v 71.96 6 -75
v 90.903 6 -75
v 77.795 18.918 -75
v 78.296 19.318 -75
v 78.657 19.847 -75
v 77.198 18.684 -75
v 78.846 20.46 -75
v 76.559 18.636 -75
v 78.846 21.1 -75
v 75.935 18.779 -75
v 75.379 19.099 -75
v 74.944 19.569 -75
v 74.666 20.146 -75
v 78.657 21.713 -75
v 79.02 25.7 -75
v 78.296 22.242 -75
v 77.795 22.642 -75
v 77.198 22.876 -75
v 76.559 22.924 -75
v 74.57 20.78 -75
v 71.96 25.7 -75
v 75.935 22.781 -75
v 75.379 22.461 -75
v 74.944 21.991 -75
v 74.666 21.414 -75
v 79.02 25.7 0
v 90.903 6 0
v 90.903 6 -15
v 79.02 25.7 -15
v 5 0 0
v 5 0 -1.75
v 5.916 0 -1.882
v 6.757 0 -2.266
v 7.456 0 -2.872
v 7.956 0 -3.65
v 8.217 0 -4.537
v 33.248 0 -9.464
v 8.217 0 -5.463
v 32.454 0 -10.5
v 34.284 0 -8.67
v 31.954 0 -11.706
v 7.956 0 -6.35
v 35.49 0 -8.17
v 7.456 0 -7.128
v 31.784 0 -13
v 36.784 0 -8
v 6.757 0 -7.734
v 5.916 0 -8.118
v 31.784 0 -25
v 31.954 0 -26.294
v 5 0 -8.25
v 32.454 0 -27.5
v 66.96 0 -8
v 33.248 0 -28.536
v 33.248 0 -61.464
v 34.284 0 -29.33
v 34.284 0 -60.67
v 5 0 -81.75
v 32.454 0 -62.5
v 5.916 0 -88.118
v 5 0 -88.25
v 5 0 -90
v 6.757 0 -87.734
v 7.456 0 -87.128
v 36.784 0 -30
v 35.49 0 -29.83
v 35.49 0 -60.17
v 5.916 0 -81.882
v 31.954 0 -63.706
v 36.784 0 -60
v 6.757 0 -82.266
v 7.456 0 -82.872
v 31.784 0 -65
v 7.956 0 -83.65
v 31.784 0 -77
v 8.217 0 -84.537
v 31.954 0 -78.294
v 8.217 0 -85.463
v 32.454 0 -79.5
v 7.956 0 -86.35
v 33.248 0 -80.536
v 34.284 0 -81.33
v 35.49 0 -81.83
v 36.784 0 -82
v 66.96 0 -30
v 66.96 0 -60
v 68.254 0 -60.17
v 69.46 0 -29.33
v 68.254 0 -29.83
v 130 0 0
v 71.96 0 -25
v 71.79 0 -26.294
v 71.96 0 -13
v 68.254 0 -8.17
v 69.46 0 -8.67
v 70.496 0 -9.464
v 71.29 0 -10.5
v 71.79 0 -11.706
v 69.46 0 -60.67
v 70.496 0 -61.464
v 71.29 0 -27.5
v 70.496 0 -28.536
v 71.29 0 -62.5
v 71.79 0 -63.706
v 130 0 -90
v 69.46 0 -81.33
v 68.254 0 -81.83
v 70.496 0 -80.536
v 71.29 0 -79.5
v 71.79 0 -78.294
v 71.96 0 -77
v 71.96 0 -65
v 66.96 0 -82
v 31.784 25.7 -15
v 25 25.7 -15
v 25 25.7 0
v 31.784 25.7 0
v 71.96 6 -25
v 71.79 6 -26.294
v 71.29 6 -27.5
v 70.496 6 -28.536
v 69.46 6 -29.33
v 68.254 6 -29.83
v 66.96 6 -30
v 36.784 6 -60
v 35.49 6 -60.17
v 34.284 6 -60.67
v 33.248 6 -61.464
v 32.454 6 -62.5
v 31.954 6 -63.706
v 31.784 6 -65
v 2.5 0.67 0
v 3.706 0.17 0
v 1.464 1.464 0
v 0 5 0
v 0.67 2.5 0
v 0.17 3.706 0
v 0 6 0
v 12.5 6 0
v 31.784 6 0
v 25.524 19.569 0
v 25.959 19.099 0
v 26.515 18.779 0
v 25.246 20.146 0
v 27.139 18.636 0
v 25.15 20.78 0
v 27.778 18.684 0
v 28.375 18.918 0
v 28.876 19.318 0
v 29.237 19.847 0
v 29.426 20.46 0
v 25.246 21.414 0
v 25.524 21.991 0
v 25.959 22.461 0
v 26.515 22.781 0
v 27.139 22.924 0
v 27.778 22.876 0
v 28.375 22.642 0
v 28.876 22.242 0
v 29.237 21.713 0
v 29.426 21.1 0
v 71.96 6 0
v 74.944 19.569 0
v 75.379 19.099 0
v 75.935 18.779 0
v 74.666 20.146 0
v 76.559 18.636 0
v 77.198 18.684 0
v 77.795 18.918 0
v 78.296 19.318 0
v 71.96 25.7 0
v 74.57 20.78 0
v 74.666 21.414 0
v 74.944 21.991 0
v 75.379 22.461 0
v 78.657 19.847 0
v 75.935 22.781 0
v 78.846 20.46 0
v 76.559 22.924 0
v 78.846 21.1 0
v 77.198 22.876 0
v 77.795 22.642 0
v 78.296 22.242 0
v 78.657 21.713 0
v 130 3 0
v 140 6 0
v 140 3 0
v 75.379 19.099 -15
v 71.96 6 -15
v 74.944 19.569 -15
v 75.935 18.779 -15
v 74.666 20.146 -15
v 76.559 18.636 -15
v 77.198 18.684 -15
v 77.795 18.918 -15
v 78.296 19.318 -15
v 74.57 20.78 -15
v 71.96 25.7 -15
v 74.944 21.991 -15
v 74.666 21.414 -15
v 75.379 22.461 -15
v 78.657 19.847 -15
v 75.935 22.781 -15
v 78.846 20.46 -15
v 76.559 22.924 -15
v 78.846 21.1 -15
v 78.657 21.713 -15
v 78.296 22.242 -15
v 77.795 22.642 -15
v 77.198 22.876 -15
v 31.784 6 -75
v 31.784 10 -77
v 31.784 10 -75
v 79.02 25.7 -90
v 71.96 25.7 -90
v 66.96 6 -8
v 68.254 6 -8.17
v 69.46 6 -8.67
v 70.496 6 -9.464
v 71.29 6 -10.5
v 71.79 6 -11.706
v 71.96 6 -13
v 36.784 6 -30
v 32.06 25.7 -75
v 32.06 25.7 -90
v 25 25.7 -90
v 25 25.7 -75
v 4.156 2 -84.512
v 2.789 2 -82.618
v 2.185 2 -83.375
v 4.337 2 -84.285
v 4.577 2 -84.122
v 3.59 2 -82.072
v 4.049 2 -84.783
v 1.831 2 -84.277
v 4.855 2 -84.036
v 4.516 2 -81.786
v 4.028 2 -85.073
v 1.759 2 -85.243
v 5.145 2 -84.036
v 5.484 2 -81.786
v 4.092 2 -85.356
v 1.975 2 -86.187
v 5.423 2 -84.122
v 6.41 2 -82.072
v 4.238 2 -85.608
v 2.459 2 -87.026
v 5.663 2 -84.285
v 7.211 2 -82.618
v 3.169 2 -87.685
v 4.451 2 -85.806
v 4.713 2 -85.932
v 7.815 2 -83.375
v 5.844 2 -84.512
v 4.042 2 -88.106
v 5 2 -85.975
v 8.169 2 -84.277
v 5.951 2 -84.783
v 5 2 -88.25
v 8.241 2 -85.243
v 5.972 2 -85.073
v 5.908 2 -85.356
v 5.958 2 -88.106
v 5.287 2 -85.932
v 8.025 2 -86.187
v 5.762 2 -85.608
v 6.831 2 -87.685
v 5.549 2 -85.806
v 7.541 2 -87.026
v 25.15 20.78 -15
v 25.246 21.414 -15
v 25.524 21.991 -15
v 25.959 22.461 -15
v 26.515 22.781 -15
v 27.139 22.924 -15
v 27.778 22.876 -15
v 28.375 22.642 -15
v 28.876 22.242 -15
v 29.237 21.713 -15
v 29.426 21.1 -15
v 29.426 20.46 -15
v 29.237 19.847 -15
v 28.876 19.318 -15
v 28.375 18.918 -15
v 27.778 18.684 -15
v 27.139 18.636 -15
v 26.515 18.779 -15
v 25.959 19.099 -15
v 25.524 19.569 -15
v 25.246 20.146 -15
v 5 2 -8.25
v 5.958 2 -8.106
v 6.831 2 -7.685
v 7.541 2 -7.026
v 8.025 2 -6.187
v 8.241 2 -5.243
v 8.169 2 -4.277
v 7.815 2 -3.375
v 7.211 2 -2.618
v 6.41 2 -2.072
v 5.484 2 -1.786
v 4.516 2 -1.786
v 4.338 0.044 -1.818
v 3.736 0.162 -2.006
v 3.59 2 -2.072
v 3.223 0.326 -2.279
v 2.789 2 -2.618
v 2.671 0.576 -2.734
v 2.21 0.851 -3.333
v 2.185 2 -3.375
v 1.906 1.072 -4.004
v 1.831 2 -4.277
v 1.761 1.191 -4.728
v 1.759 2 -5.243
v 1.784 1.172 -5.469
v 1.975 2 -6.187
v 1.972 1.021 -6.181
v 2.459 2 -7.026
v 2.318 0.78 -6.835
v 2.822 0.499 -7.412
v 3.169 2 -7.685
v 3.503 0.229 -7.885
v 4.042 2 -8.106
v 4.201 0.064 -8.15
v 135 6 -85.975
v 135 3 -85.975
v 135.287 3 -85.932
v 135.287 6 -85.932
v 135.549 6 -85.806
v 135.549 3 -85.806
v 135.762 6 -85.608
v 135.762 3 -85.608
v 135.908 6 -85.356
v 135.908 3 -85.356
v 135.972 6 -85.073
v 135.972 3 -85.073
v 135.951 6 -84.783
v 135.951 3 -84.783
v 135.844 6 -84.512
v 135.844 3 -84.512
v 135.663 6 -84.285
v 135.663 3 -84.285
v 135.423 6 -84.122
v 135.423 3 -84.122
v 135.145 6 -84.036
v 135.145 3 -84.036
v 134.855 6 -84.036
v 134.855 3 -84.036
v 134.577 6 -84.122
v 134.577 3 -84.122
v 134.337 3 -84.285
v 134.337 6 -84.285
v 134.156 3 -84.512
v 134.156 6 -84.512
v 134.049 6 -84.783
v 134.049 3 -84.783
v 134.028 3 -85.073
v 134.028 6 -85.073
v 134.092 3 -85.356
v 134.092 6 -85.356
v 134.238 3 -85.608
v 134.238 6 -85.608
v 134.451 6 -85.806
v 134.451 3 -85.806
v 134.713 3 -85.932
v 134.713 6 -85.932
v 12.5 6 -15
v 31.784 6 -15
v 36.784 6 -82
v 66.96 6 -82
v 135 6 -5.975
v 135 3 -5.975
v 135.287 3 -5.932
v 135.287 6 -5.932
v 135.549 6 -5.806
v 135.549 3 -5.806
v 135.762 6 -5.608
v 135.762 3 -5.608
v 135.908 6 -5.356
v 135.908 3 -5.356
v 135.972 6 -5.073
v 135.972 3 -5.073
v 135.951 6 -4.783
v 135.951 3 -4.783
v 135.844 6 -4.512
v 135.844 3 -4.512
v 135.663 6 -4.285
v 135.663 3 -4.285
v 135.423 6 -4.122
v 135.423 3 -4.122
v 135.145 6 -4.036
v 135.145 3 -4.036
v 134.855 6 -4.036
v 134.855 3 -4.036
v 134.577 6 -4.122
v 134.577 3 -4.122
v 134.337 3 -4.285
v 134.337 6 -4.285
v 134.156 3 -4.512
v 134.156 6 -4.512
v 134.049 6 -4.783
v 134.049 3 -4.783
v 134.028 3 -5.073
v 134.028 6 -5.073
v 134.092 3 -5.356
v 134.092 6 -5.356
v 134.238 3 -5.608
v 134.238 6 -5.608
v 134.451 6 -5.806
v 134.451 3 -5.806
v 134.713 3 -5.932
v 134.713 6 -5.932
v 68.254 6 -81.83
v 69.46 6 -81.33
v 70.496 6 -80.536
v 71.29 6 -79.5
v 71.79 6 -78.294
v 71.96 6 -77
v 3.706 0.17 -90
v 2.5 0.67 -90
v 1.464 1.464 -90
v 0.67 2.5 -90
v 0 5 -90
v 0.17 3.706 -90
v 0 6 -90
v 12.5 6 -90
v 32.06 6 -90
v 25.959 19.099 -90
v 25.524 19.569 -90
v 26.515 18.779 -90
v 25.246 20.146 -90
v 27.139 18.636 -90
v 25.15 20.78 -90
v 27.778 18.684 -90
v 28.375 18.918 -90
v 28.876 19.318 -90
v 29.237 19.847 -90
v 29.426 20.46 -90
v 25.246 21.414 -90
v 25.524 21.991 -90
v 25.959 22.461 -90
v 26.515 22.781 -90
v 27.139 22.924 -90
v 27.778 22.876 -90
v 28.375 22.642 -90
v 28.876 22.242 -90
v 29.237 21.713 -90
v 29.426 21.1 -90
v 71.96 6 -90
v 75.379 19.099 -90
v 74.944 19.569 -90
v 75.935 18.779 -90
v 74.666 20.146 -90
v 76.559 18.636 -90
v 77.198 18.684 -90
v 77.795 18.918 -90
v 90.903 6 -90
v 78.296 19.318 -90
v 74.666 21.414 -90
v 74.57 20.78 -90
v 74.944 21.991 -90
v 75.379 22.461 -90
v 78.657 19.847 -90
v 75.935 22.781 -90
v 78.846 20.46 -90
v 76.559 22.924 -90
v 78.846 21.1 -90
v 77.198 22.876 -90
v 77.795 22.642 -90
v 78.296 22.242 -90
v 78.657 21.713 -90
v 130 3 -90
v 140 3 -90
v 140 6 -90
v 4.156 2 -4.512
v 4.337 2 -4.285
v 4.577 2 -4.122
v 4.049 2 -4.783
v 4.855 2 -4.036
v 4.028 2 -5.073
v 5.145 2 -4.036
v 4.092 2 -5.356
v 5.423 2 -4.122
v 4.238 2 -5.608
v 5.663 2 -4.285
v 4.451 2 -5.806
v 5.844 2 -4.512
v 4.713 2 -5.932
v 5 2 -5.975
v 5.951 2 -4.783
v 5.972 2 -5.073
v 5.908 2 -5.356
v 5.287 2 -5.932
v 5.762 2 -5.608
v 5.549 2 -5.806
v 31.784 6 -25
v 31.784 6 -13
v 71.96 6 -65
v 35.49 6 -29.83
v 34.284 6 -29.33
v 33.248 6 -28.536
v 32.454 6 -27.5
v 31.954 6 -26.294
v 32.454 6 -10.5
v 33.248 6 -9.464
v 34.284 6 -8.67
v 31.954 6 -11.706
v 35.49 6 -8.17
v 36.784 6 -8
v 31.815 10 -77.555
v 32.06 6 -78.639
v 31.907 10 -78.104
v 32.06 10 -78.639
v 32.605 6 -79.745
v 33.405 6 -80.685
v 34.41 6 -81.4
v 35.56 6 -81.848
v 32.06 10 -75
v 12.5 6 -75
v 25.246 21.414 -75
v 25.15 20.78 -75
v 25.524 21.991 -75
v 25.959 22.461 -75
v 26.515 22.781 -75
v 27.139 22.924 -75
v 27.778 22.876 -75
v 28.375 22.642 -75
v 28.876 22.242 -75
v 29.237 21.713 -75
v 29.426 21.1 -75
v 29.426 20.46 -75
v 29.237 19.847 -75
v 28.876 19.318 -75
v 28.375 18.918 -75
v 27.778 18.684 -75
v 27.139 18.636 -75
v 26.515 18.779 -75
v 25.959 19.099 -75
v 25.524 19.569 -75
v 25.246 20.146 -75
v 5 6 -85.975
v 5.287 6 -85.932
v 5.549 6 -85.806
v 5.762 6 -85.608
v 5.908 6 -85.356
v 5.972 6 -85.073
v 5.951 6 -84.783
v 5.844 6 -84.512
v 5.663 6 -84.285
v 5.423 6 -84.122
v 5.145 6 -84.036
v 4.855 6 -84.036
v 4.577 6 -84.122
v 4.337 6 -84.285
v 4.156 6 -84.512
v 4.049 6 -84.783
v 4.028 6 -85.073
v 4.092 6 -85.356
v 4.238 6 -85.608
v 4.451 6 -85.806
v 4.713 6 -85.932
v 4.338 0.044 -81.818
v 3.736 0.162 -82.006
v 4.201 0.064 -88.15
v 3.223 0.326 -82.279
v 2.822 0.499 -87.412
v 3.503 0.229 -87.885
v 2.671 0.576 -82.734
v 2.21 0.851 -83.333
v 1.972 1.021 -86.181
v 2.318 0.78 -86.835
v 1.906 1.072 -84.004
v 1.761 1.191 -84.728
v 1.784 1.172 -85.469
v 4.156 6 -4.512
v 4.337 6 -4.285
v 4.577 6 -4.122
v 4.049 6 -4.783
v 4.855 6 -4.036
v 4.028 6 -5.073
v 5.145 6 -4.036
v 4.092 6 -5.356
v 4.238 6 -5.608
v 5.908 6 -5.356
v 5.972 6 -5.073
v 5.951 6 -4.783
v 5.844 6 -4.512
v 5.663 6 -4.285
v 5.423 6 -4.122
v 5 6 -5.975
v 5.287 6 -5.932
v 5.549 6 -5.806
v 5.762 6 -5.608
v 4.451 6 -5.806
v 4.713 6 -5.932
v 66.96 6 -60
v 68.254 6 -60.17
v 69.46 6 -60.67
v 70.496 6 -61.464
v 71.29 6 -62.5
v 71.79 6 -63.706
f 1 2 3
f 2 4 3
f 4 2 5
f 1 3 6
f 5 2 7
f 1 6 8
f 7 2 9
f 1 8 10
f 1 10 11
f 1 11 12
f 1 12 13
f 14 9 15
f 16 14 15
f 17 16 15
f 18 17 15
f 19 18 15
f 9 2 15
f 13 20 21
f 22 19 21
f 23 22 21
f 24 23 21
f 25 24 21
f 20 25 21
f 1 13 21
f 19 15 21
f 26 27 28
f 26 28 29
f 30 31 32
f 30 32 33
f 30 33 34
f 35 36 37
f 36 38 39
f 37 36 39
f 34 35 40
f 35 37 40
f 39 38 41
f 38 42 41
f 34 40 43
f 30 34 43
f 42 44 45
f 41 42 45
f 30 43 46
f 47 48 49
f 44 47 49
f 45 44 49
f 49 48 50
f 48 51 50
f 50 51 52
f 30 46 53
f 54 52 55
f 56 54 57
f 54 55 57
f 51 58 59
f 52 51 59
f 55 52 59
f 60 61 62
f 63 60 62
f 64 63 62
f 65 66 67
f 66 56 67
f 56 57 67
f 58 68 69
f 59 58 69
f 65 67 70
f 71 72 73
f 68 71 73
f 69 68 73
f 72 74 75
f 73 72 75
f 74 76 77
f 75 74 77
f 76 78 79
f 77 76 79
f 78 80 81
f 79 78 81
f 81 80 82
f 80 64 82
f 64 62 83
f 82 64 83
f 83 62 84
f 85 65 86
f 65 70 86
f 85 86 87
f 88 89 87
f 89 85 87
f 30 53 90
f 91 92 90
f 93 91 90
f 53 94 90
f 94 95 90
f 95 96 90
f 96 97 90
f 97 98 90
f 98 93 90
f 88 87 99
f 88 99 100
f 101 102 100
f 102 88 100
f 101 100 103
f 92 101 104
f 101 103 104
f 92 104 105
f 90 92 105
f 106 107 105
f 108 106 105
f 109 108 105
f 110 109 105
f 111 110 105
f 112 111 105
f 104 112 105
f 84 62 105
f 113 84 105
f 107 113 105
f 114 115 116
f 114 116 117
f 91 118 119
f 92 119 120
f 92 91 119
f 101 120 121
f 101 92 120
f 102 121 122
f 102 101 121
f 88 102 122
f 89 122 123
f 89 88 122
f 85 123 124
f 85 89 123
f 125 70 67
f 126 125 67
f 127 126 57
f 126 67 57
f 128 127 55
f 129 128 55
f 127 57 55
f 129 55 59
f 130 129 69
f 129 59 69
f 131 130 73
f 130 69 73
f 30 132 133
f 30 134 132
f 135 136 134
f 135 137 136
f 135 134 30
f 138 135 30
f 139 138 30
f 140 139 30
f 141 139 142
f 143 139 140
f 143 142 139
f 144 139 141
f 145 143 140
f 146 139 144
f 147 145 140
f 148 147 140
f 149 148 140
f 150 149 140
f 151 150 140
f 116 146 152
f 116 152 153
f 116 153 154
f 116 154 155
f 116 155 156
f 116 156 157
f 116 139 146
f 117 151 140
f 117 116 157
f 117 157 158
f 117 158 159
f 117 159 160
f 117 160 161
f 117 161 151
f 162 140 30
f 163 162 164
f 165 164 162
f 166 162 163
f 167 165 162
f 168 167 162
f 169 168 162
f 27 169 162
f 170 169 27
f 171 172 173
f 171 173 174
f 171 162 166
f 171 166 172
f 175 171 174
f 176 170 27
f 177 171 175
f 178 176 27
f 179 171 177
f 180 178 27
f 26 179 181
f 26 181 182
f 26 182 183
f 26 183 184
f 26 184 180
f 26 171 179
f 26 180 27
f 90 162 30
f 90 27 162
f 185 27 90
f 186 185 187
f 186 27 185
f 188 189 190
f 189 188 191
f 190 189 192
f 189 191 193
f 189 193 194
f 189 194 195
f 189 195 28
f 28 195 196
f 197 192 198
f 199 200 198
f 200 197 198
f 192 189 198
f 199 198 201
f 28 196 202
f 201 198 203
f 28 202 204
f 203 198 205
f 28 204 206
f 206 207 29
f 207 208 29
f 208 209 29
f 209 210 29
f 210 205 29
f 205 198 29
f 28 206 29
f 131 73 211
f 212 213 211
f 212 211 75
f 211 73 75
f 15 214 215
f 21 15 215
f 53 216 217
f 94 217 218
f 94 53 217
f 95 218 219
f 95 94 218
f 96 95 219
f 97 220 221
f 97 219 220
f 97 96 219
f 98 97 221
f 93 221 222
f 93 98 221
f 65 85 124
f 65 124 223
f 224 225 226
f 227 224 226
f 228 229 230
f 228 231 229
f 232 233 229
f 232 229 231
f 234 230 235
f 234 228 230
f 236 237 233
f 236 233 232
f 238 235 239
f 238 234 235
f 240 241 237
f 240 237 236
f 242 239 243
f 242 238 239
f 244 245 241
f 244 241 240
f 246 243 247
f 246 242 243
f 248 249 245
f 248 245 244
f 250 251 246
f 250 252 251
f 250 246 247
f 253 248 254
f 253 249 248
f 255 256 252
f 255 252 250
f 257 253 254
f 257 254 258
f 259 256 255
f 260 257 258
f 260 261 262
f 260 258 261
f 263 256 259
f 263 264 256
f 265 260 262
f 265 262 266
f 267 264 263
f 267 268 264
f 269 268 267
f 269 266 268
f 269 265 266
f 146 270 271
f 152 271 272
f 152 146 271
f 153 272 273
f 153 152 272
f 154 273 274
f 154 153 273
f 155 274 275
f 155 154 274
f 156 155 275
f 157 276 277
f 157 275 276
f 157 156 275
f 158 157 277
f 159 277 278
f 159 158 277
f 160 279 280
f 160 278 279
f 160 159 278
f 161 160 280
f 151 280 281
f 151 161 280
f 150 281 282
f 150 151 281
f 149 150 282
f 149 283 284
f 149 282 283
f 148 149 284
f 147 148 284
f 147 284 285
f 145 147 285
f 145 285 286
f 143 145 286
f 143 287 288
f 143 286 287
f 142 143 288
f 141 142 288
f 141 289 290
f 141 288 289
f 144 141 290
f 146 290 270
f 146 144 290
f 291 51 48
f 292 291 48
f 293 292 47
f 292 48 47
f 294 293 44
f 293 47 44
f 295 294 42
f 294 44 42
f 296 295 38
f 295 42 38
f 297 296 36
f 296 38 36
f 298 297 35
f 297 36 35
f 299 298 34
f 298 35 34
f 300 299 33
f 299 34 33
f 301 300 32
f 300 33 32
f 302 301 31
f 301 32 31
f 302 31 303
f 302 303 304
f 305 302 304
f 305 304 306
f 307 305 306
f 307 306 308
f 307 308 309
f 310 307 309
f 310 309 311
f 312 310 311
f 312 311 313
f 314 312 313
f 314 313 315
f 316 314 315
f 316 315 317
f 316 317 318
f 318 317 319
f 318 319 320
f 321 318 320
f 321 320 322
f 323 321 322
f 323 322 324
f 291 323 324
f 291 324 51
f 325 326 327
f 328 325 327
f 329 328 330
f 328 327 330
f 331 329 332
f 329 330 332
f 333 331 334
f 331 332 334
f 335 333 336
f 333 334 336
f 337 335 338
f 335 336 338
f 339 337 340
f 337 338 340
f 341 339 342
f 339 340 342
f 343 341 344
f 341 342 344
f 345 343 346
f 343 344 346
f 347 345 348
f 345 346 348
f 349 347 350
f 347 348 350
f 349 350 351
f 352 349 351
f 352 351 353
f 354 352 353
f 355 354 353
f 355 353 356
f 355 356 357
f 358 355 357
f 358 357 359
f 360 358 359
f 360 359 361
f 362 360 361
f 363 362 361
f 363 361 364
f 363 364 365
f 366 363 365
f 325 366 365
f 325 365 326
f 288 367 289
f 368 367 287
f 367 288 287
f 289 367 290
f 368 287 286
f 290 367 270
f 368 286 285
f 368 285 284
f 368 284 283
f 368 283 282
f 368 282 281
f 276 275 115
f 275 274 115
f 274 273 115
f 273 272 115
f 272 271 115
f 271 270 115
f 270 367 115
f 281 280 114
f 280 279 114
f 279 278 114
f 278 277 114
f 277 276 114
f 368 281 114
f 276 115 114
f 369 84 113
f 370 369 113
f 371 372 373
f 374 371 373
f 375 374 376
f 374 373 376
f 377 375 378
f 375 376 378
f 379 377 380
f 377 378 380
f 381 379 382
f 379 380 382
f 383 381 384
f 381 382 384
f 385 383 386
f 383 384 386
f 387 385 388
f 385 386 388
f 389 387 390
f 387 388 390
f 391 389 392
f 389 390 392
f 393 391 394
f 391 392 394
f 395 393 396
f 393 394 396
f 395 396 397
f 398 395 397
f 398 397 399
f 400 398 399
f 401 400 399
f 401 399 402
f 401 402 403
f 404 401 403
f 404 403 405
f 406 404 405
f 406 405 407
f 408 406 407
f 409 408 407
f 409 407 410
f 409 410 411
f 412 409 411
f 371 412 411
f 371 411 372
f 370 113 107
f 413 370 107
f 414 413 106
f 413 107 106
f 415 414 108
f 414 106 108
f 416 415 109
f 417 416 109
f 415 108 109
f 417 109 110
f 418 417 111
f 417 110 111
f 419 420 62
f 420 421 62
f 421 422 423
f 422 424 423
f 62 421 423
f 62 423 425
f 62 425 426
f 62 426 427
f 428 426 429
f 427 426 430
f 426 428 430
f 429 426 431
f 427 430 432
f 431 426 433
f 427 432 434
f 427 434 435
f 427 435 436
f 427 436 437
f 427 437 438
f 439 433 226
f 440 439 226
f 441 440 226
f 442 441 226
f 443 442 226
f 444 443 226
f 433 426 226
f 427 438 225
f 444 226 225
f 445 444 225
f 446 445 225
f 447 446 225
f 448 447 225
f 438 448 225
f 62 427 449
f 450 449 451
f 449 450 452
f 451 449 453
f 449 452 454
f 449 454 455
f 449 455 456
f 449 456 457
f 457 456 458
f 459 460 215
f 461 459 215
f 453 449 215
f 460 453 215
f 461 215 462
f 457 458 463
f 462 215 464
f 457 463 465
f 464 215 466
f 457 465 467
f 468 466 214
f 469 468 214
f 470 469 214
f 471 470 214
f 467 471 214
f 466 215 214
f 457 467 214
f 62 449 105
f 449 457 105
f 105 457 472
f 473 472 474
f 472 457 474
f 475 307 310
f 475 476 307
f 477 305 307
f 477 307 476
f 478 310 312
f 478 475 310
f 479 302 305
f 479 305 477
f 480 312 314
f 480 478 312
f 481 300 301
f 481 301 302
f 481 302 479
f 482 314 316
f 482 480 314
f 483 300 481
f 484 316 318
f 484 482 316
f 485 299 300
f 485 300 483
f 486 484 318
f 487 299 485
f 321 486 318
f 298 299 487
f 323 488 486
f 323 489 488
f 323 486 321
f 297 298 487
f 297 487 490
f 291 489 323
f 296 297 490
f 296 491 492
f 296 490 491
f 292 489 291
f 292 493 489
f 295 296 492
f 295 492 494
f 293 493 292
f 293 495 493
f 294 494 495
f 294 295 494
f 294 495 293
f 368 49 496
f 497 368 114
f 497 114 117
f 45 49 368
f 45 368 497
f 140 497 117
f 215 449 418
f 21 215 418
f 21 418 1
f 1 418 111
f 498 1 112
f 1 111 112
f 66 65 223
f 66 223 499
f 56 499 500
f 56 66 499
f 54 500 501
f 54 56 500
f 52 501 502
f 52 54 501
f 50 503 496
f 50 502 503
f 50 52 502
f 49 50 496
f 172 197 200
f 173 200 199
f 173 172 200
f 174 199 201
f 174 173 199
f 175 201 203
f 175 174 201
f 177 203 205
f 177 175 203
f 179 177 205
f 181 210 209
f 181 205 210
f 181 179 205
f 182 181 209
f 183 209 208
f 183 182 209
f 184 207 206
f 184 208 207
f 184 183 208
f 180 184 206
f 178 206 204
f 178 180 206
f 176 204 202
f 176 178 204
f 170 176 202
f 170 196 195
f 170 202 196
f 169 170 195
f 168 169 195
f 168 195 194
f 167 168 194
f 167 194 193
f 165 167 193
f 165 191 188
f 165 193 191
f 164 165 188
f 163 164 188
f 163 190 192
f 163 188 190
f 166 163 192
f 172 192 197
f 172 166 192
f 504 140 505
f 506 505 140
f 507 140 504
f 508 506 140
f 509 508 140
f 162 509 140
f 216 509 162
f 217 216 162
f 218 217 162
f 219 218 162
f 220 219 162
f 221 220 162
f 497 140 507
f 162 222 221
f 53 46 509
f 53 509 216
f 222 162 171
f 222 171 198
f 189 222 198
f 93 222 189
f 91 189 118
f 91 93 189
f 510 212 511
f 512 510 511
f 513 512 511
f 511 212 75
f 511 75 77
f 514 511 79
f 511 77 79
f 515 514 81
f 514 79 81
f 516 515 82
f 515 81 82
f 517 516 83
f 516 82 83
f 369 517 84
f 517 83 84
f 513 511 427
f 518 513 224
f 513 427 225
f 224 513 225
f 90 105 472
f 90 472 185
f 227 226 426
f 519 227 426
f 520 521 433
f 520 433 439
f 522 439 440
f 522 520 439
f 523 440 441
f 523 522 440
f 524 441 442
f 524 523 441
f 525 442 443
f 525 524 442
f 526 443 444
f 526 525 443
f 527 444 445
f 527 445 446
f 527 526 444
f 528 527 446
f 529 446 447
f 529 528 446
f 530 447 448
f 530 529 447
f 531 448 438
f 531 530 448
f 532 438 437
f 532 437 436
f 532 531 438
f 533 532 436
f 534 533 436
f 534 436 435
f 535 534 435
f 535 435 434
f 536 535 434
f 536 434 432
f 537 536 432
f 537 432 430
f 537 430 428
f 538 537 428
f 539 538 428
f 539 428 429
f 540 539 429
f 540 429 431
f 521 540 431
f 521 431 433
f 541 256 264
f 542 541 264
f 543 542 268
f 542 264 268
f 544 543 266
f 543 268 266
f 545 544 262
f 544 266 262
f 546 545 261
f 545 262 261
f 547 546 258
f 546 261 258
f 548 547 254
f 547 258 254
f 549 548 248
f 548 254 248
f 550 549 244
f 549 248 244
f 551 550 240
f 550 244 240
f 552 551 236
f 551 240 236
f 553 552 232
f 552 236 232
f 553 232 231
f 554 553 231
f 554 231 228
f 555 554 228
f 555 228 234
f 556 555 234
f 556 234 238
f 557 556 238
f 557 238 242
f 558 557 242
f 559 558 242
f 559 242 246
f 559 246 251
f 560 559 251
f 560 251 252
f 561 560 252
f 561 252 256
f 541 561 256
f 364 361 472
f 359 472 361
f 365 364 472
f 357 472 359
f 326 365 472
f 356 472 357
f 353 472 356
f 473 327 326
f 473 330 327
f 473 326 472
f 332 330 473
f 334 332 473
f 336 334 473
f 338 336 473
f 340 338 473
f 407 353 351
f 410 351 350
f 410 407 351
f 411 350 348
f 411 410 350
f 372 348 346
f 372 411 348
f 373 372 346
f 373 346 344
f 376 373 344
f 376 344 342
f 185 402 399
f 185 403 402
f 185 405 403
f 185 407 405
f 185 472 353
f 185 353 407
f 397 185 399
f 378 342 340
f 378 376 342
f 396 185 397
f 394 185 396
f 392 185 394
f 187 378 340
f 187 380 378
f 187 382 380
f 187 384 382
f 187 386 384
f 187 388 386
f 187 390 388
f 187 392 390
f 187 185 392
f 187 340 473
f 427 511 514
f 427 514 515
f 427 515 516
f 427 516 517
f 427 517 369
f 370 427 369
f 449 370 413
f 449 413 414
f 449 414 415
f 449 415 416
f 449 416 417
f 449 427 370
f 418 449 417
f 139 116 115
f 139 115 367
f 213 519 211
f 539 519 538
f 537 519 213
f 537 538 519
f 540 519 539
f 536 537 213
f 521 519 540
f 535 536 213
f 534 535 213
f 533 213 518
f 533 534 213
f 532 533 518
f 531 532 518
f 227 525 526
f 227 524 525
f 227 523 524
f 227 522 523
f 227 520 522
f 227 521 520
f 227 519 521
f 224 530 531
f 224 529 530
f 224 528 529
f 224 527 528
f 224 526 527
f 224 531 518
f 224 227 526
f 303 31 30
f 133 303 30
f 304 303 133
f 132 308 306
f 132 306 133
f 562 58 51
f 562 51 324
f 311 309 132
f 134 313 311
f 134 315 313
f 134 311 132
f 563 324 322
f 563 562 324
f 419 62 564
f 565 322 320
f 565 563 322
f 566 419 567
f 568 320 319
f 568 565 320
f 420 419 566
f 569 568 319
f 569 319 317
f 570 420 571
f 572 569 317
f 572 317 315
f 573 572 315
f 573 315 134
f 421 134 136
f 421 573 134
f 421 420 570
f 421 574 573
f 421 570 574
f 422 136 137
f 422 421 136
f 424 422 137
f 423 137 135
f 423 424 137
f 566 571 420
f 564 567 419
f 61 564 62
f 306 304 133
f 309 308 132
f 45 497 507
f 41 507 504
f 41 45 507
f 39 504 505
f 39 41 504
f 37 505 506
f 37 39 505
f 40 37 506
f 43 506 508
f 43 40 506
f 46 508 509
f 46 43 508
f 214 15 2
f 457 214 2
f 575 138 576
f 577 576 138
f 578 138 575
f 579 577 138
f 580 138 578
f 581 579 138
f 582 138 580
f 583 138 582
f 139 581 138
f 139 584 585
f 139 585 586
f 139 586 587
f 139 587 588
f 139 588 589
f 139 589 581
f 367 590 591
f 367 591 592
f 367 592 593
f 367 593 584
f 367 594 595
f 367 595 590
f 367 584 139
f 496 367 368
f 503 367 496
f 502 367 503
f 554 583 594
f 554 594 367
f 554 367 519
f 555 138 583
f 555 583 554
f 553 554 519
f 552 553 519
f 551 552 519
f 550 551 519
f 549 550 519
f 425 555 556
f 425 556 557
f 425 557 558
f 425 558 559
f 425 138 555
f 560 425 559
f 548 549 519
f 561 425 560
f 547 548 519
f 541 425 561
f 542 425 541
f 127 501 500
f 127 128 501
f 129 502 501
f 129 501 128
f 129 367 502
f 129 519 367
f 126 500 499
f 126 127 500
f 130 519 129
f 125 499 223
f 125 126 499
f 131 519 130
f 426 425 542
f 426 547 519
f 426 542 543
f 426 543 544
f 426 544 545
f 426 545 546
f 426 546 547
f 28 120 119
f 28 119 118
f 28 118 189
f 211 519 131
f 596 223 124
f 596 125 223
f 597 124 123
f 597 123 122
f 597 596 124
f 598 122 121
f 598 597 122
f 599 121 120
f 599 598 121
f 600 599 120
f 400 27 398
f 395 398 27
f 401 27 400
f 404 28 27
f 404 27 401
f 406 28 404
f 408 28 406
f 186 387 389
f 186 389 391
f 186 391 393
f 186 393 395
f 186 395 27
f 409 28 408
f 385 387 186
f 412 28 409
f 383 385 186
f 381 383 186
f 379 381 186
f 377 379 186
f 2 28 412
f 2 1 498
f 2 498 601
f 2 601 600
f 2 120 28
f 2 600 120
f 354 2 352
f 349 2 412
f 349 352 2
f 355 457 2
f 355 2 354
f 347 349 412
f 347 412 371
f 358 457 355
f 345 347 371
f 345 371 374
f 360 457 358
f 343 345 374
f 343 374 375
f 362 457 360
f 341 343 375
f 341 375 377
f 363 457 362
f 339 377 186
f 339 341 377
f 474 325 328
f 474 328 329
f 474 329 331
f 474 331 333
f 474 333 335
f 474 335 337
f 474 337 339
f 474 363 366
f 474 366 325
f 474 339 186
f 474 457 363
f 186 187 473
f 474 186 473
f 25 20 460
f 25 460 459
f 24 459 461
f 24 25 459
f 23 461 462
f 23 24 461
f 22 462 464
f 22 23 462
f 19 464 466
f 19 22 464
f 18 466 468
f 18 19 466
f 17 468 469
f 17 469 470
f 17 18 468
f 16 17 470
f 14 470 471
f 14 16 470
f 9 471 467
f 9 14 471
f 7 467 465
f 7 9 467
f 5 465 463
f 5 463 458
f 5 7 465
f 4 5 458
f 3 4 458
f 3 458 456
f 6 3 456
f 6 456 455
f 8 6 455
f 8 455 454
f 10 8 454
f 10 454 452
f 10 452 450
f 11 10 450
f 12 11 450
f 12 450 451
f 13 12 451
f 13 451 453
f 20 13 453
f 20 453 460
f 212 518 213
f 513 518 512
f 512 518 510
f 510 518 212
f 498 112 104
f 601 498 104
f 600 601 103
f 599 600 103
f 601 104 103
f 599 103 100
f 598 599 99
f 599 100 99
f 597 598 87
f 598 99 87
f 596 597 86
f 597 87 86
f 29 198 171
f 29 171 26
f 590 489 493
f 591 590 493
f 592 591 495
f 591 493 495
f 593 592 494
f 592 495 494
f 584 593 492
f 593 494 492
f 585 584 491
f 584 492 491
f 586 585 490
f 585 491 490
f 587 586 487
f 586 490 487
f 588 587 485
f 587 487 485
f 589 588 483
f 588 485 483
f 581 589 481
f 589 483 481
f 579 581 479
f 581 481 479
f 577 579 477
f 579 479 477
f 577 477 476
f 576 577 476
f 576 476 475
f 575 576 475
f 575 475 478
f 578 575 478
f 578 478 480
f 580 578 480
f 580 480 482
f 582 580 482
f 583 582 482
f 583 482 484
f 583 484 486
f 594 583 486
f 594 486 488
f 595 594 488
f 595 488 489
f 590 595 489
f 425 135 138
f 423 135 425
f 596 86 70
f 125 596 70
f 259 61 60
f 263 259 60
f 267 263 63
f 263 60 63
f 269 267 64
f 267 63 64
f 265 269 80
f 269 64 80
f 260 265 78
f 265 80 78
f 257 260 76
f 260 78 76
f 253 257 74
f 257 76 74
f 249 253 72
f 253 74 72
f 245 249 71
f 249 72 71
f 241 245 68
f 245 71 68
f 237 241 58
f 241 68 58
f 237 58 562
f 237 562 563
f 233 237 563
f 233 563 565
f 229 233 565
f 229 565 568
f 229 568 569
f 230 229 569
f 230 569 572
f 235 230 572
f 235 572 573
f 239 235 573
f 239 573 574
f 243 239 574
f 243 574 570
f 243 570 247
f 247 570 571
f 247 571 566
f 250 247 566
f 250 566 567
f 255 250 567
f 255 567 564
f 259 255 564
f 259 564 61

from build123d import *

# Parameters (mm, degrees)
SKIZZE1_W                             = 140
SKIZZE1_H                             = 90
AUFSATZ_LINEAR_AUSTRAGEN1_DEPTH       = 6
SKIZZE2_W                             = 10
SKIZZE2_H                             = 90
SCHNITT_LINEAR_AUSTRAGEN1_DEPTH       = 3
SKIZZE3_W                             = 7.06
SKIZZE3_H                             = 25.7
SKIZZE3_R                             = 2.1
AUFSATZ_LINEAR_AUSTRAGEN2_DEPTH       = 15
AUFSATZ_LINEAR_START                  = -15
SKIZZE4_W                             = 6.783859635
SKIZZE4_H                             = 25.7
SKIZZE4_R                             = 2.1
SKIZZE4_W_2                           = 7.06
AUFSATZ_LINEAR_AUSTRAGEN3_DEPTH       = 15
VERRUNDUNG1_R                         = 5
SCHNITT_LINEAR_AUSTRAGEN2_DEPTH       = 10
SKIZZE6_R                             = 0.975
SCHNITT_LINEAR_AUSTRAGEN3_DEPTH       = 10
SKIZZE7_R                             = 3.25
SCHNITT_LINEAR_AUSTRAGEN4_DEPTH       = 2
AUFSATZ_LINEAR_START_2                = -90
AUFSATZ_LINEAR_AUSTRAGEN4_OUTLINE_R   = 2.15
AUFSATZ_LINEAR_AUSTRAGEN4_OUTLINE_R_2 = 2.1
AUFSATZ_LINEAR_AUSTRAGEN4_DEPTH       = 90
AUFSATZ_LINEAR_AUSTRAGEN4_2_DEPTH     = 15
AUFSATZ_LINEAR_AUSTRAGEN5_DEPTH       = 15
AUFSATZ_LINEAR_AUSTRAGEN6_DEPTH       = 15


# Read off the part's stored shape, not the designer's step: Aufsatz-Linear austragen4
with BuildPart() as part:
    # Skizze1 → Aufsatz-Linear austragen1 (new body)
    with BuildSketch(Plane(origin=(0, 0, 0), x_dir=(1, 0, 0), z_dir=(0, 1, 0))):
        with Locations((70, 45)):
            Rectangle(SKIZZE1_W, SKIZZE1_H)
    extrude(amount=AUFSATZ_LINEAR_AUSTRAGEN1_DEPTH)

    # Skizze2 → Schnitt-Linear austragen1 (cut)
    with BuildSketch(Plane.XZ):
        with Locations((135, -45)):
            Rectangle(SKIZZE2_W, SKIZZE2_H)
    extrude(amount=-SCHNITT_LINEAR_AUSTRAGEN1_DEPTH, mode=Mode.SUBTRACT)

    # Skizze3 → Aufsatz-Linear austragen2 (add)
    # profile 1 of 2: a face of its own
    with BuildSketch(Plane(origin=(0, 0, -90), x_dir=(-1, 0, 0), z_dir=(0, 0, -1))):
        with Locations((-75.49, 12.85)):
            Rectangle(SKIZZE3_W, SKIZZE3_H)
        with Locations((-76.72, 20.78)):
            Circle(SKIZZE3_R, mode=Mode.SUBTRACT)
    # profile 2 of 2: a face of its own
    with BuildSketch(Plane(origin=(0, 0, -90), x_dir=(-1, 0, 0), z_dir=(0, 0, -1))):
        with Locations((-28.53, 12.85)):
            Rectangle(SKIZZE3_W, SKIZZE3_H)
        with Locations((-27.3, 20.78)):
            Circle(SKIZZE3_R, mode=Mode.SUBTRACT)
    extrude(amount=-AUFSATZ_LINEAR_AUSTRAGEN2_DEPTH)

    # Skizze4 → Aufsatz-Linear austragen3 (add)
    # profile 1 of 2: a face of its own
    with BuildSketch(Plane.XY.offset(AUFSATZ_LINEAR_START)):
        with Locations((28.391929817, 12.85)):
            Rectangle(SKIZZE4_W, SKIZZE4_H)
        with Locations(Location((27.3, 20.78, 0), (0, 0, 180))):
            Circle(SKIZZE4_R, mode=Mode.SUBTRACT)
    # profile 2 of 2: a face of its own
    with BuildSketch(Plane.XY.offset(AUFSATZ_LINEAR_START)):
        with Locations((75.49, 12.85)):
            Rectangle(SKIZZE4_W_2, SKIZZE4_H)
        with Locations(Location((76.72, 20.78, 0), (0, 0, 180))):
            Circle(SKIZZE4_R, mode=Mode.SUBTRACT)
    extrude(amount=AUFSATZ_LINEAR_AUSTRAGEN3_DEPTH)

    # Verrundung1
    verrundung1_edges = [part.edges().sort_by_distance(p)[0] for p in [
        (0, 0, -45),
    ]]
    fillet(verrundung1_edges, radius=VERRUNDUNG1_R)

    # Skizze5 → Schnitt-Linear austragen2 (cut)
    with BuildSketch(Plane(origin=(0, 0, 0), x_dir=(-1, 0, 0), z_dir=(0, -1, 0))):
        with BuildLine():
            Line((-36.783859635, 8), (-66.96, 8))
            ThreePointArc((-66.96, 8), (-70.495533906, 9.464466094), (-71.96, 13))
            Line((-71.96, 13), (-71.96, 25))
            ThreePointArc((-71.96, 25), (-70.495533906, 28.535533906), (-66.96, 30))
            Line((-66.96, 30), (-36.783859635, 30))
            ThreePointArc((-36.783859635, 30), (-33.248325729, 28.535533906), (-31.783859635, 25))
            Line((-31.783859635, 25), (-31.783859635, 13))
            ThreePointArc((-31.783859635, 13), (-33.248325729, 9.464466094), (-36.783859635, 8))
        make_face()
        with BuildLine():
            Line((-36.783859635, 82), (-66.96, 82))
            ThreePointArc((-66.96, 82), (-70.495533906, 80.535533906), (-71.96, 77))
            Line((-71.96, 77), (-71.96, 65))
            ThreePointArc((-71.96, 65), (-70.495533906, 61.464466094), (-66.96, 60))
            Line((-66.96, 60), (-36.783859635, 60))
            ThreePointArc((-36.783859635, 60), (-33.248325729, 61.464466094), (-31.783859635, 65))
            Line((-31.783859635, 65), (-31.783859635, 77))
            ThreePointArc((-31.783859635, 77), (-33.248325729, 80.535533906), (-36.783859635, 82))
        make_face()
    extrude(amount=-SCHNITT_LINEAR_AUSTRAGEN2_DEPTH, mode=Mode.SUBTRACT)

    # Skizze6 → Schnitt-Linear austragen3 (cut)
    with BuildSketch(Plane.XZ):
        with Locations(Location((135, -5, 0), (0, 0, 270))):
            Circle(SKIZZE6_R)
        with Locations(Location((5, -85, 0), (0, 0, 270))):
            Circle(SKIZZE6_R)
        with Locations(Location((135, -85, 0), (0, 0, 270))):
            Circle(SKIZZE6_R)
        with Locations(Location((5, -5, 0), (0, 0, 270))):
            Circle(SKIZZE6_R)
    extrude(amount=-SCHNITT_LINEAR_AUSTRAGEN3_DEPTH, mode=Mode.SUBTRACT)

    # Skizze7 → Schnitt-Linear austragen4 (cut)
    with BuildSketch(Plane.XZ):
        with Locations(Location((5, -5, 0), (0, 0, 270))):
            Circle(SKIZZE7_R)
        with Locations(Location((5, -85, 0), (0, 0, 270))):
            Circle(SKIZZE7_R)
    extrude(amount=-SCHNITT_LINEAR_AUSTRAGEN4_DEPTH, mode=Mode.SUBTRACT)

    # Aufsatz-Linear austragen4 outline → Aufsatz-Linear austragen4 (cut)
    # profile 1 of 2: a face of its own
    with BuildSketch(Plane(origin=(0, 0, -90), x_dir=(-1, 0, 0), z_dir=(0, 0, -1)).offset(AUFSATZ_LINEAR_START_2)):
        with Locations((-76.72, 20.78)):
            Circle(AUFSATZ_LINEAR_AUSTRAGEN4_OUTLINE_R)
        with Locations((-76.72, 20.78)):
            Circle(AUFSATZ_LINEAR_AUSTRAGEN4_OUTLINE_R_2, mode=Mode.SUBTRACT)
    # profile 2 of 2: a face of its own
    with BuildSketch(Plane(origin=(0, 0, -90), x_dir=(-1, 0, 0), z_dir=(0, 0, -1)).offset(AUFSATZ_LINEAR_START_2)):
        with Locations((-27.3, 20.78)):
            Circle(AUFSATZ_LINEAR_AUSTRAGEN4_OUTLINE_R)
        with Locations((-27.3, 20.78)):
            Circle(AUFSATZ_LINEAR_AUSTRAGEN4_OUTLINE_R_2, mode=Mode.SUBTRACT)
    extrude(amount=AUFSATZ_LINEAR_AUSTRAGEN4_DEPTH, mode=Mode.SUBTRACT)

    # Aufsatz-Linear austragen4 2 outline → Aufsatz-Linear austragen4 2 (add)
    with BuildSketch(Plane(origin=(0, 0, -90), x_dir=(-1, 0, 0), z_dir=(0, 0, -1)).offset(AUFSATZ_LINEAR_START)):
        Polygon((-79.02, 6), (-79.02, 25.7), (-90.903397377, 6), align=None)
    extrude(amount=AUFSATZ_LINEAR_AUSTRAGEN4_2_DEPTH)

    # Skizze10 → Aufsatz-Linear austragen5 (add)
    with BuildSketch(Plane(origin=(0, 0, -90), x_dir=(-1, 0, 0), z_dir=(0, 0, -1))):
        Polygon((-25, 25.7), (-12.5, 6), (-25, 6), align=None)
    extrude(amount=-AUFSATZ_LINEAR_AUSTRAGEN5_DEPTH)

    # Skizze11 → Aufsatz-Linear austragen6 (add)
    with BuildSketch(Plane.XY):
        Polygon((25, 25.7), (12.5, 6), (25, 6), align=None)
        Polygon((79.02, 25.7), (79.02, 6), (90.903397377, 6), align=None)
    extrude(amount=-AUFSATZ_LINEAR_AUSTRAGEN6_DEPTH)


solid = part.part
